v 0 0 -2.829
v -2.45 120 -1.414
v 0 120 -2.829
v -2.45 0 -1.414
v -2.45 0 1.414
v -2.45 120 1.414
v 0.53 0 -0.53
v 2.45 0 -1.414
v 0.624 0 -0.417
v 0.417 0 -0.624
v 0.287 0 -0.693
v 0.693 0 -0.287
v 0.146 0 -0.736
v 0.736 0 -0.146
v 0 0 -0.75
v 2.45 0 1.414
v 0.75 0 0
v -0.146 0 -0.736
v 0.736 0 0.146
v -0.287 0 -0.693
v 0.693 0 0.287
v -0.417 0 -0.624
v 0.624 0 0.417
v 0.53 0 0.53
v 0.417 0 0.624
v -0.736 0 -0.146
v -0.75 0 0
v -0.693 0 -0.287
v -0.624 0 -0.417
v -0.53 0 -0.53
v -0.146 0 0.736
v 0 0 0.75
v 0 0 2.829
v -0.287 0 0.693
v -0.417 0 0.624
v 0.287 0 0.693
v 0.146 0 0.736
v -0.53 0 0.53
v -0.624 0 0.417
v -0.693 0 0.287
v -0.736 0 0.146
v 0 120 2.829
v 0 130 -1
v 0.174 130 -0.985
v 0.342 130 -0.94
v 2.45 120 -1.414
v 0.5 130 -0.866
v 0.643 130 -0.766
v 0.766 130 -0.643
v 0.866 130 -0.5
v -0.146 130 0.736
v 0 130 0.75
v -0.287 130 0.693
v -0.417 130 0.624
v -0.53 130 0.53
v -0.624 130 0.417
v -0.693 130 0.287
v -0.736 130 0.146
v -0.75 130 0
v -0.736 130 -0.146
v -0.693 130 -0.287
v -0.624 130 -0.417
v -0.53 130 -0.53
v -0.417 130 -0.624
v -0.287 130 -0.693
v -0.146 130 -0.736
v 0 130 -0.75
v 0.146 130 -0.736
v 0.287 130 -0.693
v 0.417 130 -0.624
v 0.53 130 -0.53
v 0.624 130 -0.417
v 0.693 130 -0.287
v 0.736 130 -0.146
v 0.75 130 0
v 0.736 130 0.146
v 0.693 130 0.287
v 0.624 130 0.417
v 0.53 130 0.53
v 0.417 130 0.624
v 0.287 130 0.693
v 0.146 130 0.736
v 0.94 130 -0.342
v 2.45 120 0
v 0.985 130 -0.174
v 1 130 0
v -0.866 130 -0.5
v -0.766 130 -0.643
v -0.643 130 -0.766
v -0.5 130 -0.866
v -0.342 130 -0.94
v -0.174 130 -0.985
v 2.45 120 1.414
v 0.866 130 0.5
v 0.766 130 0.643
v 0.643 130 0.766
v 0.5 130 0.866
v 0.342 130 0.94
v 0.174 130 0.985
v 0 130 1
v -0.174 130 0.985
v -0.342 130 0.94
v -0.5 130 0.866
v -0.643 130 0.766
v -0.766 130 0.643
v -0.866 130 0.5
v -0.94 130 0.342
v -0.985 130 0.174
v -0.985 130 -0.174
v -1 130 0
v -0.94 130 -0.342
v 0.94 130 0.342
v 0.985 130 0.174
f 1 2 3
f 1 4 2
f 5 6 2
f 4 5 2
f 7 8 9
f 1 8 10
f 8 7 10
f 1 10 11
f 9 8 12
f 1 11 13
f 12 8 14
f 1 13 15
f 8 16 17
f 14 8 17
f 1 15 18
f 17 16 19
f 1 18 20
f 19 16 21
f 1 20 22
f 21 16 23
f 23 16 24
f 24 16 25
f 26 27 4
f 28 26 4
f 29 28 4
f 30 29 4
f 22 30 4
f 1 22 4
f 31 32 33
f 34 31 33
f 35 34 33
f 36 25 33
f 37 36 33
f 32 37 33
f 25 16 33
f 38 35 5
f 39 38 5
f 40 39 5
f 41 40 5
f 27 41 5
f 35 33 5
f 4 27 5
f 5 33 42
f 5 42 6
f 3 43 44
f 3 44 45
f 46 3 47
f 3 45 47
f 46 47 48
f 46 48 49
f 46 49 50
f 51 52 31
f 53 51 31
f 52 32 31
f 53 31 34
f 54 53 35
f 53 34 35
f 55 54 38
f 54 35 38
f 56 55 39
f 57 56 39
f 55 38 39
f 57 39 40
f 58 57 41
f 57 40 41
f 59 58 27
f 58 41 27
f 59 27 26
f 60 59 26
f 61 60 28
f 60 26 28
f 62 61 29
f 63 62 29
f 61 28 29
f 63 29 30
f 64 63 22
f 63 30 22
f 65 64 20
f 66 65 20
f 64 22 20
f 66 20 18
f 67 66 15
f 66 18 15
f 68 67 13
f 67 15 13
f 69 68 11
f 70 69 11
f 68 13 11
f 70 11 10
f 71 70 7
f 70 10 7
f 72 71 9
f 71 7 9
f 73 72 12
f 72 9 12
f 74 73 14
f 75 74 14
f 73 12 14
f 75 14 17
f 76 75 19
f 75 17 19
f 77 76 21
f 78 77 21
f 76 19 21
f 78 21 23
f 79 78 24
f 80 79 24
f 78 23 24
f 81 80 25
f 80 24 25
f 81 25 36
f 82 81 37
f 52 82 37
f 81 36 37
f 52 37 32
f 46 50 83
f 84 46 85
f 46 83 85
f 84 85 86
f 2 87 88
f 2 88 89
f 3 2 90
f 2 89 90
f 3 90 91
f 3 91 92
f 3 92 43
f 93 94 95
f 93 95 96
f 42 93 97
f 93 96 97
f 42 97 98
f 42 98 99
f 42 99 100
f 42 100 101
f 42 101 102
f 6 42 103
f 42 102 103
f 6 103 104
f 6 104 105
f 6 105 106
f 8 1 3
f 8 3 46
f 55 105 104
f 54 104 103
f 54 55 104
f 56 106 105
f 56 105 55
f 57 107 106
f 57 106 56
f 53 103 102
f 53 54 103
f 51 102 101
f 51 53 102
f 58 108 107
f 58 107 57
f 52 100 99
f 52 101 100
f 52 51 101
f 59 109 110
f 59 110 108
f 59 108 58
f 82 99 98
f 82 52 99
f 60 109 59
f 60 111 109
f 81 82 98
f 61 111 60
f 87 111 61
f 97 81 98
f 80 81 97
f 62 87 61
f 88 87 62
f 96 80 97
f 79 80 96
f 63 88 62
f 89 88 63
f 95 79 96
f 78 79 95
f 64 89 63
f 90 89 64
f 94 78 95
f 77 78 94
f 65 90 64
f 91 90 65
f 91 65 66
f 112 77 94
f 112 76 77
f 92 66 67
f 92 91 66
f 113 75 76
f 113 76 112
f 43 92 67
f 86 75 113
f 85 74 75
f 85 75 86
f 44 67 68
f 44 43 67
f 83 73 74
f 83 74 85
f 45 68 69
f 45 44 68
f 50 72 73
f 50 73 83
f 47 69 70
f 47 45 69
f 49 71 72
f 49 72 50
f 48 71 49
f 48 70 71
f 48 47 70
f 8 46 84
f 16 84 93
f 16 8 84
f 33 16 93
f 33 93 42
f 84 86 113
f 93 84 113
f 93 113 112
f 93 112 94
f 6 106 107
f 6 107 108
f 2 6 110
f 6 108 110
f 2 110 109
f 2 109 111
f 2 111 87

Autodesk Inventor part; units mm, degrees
ref_plane "YZ Plane" through (0, 0, 0) normal (1, 0, 0) x (0, 1, 0)
ref_plane "XZ Plane" through (0, 0, 0) normal (0, 1, 0) x (-1, 0, 0)
sketch "Sketch1" plane through (0, 0, 0) normal (0, 1, 0) x (-1, 0, 0)
  line L0 (2.45, -1.4145) -> (0, -2.829)
  line L1 (0, -2.829) -> (-2.45, -1.4145)
  line L2 (-2.45, -1.4145) -> (-2.45, 1.4145)
  line L3 (-2.45, 1.4145) -> (0, 2.829)
  line L4 (0, 2.829) -> (2.45, 1.4145)
  line L5 (2.45, 1.4145) -> (2.45, -1.4145)
  point P0 (0, 0)
  point P1 (0, 0)
  dimension "d0" = 4.9
extrude "Extrusion1" add sketch "Sketch1" along normal blind 120
ref_plane "Work Plane1" through (0, 130, 0) normal (0, 1, 0) x (1, 0, 0)
sketch "Sketch2" plane through (0, 120, 0) normal (0, 1, 0) x (1, 0, 0)
  line L0 (-2.45, 1.4145) -> (0, 2.829)
  line L1 (0, 2.829) -> (2.45, 1.4145)
  line L2 (2.45, 1.4145) -> (2.45, -1.4145)
  line L3 (2.45, -1.4145) -> (0, -2.829)
  line L4 (0, -2.829) -> (-2.45, -1.4145)
  line L5 (-2.45, -1.4145) -> (-2.45, 1.4145)
  point P0 (0, 0)
  point P1 (0, 0)
  dimension "d4" = 4.9
sketch "Sketch3" plane through (0, 130, 0) normal (0, 1, 0) x (1, 0, 0)
  circle A0 centre (0, 0) radius 1
  dimension "d5" = 2
loft "Loft1" add profiles "Sketch3" section 1 edges at (-1.225, 120, -2.1218) (-2.45, 120, 0) (-1.225, 120, 2.1218) (1.225, 120, 2.1218) (2.45, 120, 0) (1.225, 120, -2.1218)
hole "Hole1" at (0, 130, 0) direction (0, -1, 0) diameter 1.5 end through all
properties part number "Pencil Shell"
